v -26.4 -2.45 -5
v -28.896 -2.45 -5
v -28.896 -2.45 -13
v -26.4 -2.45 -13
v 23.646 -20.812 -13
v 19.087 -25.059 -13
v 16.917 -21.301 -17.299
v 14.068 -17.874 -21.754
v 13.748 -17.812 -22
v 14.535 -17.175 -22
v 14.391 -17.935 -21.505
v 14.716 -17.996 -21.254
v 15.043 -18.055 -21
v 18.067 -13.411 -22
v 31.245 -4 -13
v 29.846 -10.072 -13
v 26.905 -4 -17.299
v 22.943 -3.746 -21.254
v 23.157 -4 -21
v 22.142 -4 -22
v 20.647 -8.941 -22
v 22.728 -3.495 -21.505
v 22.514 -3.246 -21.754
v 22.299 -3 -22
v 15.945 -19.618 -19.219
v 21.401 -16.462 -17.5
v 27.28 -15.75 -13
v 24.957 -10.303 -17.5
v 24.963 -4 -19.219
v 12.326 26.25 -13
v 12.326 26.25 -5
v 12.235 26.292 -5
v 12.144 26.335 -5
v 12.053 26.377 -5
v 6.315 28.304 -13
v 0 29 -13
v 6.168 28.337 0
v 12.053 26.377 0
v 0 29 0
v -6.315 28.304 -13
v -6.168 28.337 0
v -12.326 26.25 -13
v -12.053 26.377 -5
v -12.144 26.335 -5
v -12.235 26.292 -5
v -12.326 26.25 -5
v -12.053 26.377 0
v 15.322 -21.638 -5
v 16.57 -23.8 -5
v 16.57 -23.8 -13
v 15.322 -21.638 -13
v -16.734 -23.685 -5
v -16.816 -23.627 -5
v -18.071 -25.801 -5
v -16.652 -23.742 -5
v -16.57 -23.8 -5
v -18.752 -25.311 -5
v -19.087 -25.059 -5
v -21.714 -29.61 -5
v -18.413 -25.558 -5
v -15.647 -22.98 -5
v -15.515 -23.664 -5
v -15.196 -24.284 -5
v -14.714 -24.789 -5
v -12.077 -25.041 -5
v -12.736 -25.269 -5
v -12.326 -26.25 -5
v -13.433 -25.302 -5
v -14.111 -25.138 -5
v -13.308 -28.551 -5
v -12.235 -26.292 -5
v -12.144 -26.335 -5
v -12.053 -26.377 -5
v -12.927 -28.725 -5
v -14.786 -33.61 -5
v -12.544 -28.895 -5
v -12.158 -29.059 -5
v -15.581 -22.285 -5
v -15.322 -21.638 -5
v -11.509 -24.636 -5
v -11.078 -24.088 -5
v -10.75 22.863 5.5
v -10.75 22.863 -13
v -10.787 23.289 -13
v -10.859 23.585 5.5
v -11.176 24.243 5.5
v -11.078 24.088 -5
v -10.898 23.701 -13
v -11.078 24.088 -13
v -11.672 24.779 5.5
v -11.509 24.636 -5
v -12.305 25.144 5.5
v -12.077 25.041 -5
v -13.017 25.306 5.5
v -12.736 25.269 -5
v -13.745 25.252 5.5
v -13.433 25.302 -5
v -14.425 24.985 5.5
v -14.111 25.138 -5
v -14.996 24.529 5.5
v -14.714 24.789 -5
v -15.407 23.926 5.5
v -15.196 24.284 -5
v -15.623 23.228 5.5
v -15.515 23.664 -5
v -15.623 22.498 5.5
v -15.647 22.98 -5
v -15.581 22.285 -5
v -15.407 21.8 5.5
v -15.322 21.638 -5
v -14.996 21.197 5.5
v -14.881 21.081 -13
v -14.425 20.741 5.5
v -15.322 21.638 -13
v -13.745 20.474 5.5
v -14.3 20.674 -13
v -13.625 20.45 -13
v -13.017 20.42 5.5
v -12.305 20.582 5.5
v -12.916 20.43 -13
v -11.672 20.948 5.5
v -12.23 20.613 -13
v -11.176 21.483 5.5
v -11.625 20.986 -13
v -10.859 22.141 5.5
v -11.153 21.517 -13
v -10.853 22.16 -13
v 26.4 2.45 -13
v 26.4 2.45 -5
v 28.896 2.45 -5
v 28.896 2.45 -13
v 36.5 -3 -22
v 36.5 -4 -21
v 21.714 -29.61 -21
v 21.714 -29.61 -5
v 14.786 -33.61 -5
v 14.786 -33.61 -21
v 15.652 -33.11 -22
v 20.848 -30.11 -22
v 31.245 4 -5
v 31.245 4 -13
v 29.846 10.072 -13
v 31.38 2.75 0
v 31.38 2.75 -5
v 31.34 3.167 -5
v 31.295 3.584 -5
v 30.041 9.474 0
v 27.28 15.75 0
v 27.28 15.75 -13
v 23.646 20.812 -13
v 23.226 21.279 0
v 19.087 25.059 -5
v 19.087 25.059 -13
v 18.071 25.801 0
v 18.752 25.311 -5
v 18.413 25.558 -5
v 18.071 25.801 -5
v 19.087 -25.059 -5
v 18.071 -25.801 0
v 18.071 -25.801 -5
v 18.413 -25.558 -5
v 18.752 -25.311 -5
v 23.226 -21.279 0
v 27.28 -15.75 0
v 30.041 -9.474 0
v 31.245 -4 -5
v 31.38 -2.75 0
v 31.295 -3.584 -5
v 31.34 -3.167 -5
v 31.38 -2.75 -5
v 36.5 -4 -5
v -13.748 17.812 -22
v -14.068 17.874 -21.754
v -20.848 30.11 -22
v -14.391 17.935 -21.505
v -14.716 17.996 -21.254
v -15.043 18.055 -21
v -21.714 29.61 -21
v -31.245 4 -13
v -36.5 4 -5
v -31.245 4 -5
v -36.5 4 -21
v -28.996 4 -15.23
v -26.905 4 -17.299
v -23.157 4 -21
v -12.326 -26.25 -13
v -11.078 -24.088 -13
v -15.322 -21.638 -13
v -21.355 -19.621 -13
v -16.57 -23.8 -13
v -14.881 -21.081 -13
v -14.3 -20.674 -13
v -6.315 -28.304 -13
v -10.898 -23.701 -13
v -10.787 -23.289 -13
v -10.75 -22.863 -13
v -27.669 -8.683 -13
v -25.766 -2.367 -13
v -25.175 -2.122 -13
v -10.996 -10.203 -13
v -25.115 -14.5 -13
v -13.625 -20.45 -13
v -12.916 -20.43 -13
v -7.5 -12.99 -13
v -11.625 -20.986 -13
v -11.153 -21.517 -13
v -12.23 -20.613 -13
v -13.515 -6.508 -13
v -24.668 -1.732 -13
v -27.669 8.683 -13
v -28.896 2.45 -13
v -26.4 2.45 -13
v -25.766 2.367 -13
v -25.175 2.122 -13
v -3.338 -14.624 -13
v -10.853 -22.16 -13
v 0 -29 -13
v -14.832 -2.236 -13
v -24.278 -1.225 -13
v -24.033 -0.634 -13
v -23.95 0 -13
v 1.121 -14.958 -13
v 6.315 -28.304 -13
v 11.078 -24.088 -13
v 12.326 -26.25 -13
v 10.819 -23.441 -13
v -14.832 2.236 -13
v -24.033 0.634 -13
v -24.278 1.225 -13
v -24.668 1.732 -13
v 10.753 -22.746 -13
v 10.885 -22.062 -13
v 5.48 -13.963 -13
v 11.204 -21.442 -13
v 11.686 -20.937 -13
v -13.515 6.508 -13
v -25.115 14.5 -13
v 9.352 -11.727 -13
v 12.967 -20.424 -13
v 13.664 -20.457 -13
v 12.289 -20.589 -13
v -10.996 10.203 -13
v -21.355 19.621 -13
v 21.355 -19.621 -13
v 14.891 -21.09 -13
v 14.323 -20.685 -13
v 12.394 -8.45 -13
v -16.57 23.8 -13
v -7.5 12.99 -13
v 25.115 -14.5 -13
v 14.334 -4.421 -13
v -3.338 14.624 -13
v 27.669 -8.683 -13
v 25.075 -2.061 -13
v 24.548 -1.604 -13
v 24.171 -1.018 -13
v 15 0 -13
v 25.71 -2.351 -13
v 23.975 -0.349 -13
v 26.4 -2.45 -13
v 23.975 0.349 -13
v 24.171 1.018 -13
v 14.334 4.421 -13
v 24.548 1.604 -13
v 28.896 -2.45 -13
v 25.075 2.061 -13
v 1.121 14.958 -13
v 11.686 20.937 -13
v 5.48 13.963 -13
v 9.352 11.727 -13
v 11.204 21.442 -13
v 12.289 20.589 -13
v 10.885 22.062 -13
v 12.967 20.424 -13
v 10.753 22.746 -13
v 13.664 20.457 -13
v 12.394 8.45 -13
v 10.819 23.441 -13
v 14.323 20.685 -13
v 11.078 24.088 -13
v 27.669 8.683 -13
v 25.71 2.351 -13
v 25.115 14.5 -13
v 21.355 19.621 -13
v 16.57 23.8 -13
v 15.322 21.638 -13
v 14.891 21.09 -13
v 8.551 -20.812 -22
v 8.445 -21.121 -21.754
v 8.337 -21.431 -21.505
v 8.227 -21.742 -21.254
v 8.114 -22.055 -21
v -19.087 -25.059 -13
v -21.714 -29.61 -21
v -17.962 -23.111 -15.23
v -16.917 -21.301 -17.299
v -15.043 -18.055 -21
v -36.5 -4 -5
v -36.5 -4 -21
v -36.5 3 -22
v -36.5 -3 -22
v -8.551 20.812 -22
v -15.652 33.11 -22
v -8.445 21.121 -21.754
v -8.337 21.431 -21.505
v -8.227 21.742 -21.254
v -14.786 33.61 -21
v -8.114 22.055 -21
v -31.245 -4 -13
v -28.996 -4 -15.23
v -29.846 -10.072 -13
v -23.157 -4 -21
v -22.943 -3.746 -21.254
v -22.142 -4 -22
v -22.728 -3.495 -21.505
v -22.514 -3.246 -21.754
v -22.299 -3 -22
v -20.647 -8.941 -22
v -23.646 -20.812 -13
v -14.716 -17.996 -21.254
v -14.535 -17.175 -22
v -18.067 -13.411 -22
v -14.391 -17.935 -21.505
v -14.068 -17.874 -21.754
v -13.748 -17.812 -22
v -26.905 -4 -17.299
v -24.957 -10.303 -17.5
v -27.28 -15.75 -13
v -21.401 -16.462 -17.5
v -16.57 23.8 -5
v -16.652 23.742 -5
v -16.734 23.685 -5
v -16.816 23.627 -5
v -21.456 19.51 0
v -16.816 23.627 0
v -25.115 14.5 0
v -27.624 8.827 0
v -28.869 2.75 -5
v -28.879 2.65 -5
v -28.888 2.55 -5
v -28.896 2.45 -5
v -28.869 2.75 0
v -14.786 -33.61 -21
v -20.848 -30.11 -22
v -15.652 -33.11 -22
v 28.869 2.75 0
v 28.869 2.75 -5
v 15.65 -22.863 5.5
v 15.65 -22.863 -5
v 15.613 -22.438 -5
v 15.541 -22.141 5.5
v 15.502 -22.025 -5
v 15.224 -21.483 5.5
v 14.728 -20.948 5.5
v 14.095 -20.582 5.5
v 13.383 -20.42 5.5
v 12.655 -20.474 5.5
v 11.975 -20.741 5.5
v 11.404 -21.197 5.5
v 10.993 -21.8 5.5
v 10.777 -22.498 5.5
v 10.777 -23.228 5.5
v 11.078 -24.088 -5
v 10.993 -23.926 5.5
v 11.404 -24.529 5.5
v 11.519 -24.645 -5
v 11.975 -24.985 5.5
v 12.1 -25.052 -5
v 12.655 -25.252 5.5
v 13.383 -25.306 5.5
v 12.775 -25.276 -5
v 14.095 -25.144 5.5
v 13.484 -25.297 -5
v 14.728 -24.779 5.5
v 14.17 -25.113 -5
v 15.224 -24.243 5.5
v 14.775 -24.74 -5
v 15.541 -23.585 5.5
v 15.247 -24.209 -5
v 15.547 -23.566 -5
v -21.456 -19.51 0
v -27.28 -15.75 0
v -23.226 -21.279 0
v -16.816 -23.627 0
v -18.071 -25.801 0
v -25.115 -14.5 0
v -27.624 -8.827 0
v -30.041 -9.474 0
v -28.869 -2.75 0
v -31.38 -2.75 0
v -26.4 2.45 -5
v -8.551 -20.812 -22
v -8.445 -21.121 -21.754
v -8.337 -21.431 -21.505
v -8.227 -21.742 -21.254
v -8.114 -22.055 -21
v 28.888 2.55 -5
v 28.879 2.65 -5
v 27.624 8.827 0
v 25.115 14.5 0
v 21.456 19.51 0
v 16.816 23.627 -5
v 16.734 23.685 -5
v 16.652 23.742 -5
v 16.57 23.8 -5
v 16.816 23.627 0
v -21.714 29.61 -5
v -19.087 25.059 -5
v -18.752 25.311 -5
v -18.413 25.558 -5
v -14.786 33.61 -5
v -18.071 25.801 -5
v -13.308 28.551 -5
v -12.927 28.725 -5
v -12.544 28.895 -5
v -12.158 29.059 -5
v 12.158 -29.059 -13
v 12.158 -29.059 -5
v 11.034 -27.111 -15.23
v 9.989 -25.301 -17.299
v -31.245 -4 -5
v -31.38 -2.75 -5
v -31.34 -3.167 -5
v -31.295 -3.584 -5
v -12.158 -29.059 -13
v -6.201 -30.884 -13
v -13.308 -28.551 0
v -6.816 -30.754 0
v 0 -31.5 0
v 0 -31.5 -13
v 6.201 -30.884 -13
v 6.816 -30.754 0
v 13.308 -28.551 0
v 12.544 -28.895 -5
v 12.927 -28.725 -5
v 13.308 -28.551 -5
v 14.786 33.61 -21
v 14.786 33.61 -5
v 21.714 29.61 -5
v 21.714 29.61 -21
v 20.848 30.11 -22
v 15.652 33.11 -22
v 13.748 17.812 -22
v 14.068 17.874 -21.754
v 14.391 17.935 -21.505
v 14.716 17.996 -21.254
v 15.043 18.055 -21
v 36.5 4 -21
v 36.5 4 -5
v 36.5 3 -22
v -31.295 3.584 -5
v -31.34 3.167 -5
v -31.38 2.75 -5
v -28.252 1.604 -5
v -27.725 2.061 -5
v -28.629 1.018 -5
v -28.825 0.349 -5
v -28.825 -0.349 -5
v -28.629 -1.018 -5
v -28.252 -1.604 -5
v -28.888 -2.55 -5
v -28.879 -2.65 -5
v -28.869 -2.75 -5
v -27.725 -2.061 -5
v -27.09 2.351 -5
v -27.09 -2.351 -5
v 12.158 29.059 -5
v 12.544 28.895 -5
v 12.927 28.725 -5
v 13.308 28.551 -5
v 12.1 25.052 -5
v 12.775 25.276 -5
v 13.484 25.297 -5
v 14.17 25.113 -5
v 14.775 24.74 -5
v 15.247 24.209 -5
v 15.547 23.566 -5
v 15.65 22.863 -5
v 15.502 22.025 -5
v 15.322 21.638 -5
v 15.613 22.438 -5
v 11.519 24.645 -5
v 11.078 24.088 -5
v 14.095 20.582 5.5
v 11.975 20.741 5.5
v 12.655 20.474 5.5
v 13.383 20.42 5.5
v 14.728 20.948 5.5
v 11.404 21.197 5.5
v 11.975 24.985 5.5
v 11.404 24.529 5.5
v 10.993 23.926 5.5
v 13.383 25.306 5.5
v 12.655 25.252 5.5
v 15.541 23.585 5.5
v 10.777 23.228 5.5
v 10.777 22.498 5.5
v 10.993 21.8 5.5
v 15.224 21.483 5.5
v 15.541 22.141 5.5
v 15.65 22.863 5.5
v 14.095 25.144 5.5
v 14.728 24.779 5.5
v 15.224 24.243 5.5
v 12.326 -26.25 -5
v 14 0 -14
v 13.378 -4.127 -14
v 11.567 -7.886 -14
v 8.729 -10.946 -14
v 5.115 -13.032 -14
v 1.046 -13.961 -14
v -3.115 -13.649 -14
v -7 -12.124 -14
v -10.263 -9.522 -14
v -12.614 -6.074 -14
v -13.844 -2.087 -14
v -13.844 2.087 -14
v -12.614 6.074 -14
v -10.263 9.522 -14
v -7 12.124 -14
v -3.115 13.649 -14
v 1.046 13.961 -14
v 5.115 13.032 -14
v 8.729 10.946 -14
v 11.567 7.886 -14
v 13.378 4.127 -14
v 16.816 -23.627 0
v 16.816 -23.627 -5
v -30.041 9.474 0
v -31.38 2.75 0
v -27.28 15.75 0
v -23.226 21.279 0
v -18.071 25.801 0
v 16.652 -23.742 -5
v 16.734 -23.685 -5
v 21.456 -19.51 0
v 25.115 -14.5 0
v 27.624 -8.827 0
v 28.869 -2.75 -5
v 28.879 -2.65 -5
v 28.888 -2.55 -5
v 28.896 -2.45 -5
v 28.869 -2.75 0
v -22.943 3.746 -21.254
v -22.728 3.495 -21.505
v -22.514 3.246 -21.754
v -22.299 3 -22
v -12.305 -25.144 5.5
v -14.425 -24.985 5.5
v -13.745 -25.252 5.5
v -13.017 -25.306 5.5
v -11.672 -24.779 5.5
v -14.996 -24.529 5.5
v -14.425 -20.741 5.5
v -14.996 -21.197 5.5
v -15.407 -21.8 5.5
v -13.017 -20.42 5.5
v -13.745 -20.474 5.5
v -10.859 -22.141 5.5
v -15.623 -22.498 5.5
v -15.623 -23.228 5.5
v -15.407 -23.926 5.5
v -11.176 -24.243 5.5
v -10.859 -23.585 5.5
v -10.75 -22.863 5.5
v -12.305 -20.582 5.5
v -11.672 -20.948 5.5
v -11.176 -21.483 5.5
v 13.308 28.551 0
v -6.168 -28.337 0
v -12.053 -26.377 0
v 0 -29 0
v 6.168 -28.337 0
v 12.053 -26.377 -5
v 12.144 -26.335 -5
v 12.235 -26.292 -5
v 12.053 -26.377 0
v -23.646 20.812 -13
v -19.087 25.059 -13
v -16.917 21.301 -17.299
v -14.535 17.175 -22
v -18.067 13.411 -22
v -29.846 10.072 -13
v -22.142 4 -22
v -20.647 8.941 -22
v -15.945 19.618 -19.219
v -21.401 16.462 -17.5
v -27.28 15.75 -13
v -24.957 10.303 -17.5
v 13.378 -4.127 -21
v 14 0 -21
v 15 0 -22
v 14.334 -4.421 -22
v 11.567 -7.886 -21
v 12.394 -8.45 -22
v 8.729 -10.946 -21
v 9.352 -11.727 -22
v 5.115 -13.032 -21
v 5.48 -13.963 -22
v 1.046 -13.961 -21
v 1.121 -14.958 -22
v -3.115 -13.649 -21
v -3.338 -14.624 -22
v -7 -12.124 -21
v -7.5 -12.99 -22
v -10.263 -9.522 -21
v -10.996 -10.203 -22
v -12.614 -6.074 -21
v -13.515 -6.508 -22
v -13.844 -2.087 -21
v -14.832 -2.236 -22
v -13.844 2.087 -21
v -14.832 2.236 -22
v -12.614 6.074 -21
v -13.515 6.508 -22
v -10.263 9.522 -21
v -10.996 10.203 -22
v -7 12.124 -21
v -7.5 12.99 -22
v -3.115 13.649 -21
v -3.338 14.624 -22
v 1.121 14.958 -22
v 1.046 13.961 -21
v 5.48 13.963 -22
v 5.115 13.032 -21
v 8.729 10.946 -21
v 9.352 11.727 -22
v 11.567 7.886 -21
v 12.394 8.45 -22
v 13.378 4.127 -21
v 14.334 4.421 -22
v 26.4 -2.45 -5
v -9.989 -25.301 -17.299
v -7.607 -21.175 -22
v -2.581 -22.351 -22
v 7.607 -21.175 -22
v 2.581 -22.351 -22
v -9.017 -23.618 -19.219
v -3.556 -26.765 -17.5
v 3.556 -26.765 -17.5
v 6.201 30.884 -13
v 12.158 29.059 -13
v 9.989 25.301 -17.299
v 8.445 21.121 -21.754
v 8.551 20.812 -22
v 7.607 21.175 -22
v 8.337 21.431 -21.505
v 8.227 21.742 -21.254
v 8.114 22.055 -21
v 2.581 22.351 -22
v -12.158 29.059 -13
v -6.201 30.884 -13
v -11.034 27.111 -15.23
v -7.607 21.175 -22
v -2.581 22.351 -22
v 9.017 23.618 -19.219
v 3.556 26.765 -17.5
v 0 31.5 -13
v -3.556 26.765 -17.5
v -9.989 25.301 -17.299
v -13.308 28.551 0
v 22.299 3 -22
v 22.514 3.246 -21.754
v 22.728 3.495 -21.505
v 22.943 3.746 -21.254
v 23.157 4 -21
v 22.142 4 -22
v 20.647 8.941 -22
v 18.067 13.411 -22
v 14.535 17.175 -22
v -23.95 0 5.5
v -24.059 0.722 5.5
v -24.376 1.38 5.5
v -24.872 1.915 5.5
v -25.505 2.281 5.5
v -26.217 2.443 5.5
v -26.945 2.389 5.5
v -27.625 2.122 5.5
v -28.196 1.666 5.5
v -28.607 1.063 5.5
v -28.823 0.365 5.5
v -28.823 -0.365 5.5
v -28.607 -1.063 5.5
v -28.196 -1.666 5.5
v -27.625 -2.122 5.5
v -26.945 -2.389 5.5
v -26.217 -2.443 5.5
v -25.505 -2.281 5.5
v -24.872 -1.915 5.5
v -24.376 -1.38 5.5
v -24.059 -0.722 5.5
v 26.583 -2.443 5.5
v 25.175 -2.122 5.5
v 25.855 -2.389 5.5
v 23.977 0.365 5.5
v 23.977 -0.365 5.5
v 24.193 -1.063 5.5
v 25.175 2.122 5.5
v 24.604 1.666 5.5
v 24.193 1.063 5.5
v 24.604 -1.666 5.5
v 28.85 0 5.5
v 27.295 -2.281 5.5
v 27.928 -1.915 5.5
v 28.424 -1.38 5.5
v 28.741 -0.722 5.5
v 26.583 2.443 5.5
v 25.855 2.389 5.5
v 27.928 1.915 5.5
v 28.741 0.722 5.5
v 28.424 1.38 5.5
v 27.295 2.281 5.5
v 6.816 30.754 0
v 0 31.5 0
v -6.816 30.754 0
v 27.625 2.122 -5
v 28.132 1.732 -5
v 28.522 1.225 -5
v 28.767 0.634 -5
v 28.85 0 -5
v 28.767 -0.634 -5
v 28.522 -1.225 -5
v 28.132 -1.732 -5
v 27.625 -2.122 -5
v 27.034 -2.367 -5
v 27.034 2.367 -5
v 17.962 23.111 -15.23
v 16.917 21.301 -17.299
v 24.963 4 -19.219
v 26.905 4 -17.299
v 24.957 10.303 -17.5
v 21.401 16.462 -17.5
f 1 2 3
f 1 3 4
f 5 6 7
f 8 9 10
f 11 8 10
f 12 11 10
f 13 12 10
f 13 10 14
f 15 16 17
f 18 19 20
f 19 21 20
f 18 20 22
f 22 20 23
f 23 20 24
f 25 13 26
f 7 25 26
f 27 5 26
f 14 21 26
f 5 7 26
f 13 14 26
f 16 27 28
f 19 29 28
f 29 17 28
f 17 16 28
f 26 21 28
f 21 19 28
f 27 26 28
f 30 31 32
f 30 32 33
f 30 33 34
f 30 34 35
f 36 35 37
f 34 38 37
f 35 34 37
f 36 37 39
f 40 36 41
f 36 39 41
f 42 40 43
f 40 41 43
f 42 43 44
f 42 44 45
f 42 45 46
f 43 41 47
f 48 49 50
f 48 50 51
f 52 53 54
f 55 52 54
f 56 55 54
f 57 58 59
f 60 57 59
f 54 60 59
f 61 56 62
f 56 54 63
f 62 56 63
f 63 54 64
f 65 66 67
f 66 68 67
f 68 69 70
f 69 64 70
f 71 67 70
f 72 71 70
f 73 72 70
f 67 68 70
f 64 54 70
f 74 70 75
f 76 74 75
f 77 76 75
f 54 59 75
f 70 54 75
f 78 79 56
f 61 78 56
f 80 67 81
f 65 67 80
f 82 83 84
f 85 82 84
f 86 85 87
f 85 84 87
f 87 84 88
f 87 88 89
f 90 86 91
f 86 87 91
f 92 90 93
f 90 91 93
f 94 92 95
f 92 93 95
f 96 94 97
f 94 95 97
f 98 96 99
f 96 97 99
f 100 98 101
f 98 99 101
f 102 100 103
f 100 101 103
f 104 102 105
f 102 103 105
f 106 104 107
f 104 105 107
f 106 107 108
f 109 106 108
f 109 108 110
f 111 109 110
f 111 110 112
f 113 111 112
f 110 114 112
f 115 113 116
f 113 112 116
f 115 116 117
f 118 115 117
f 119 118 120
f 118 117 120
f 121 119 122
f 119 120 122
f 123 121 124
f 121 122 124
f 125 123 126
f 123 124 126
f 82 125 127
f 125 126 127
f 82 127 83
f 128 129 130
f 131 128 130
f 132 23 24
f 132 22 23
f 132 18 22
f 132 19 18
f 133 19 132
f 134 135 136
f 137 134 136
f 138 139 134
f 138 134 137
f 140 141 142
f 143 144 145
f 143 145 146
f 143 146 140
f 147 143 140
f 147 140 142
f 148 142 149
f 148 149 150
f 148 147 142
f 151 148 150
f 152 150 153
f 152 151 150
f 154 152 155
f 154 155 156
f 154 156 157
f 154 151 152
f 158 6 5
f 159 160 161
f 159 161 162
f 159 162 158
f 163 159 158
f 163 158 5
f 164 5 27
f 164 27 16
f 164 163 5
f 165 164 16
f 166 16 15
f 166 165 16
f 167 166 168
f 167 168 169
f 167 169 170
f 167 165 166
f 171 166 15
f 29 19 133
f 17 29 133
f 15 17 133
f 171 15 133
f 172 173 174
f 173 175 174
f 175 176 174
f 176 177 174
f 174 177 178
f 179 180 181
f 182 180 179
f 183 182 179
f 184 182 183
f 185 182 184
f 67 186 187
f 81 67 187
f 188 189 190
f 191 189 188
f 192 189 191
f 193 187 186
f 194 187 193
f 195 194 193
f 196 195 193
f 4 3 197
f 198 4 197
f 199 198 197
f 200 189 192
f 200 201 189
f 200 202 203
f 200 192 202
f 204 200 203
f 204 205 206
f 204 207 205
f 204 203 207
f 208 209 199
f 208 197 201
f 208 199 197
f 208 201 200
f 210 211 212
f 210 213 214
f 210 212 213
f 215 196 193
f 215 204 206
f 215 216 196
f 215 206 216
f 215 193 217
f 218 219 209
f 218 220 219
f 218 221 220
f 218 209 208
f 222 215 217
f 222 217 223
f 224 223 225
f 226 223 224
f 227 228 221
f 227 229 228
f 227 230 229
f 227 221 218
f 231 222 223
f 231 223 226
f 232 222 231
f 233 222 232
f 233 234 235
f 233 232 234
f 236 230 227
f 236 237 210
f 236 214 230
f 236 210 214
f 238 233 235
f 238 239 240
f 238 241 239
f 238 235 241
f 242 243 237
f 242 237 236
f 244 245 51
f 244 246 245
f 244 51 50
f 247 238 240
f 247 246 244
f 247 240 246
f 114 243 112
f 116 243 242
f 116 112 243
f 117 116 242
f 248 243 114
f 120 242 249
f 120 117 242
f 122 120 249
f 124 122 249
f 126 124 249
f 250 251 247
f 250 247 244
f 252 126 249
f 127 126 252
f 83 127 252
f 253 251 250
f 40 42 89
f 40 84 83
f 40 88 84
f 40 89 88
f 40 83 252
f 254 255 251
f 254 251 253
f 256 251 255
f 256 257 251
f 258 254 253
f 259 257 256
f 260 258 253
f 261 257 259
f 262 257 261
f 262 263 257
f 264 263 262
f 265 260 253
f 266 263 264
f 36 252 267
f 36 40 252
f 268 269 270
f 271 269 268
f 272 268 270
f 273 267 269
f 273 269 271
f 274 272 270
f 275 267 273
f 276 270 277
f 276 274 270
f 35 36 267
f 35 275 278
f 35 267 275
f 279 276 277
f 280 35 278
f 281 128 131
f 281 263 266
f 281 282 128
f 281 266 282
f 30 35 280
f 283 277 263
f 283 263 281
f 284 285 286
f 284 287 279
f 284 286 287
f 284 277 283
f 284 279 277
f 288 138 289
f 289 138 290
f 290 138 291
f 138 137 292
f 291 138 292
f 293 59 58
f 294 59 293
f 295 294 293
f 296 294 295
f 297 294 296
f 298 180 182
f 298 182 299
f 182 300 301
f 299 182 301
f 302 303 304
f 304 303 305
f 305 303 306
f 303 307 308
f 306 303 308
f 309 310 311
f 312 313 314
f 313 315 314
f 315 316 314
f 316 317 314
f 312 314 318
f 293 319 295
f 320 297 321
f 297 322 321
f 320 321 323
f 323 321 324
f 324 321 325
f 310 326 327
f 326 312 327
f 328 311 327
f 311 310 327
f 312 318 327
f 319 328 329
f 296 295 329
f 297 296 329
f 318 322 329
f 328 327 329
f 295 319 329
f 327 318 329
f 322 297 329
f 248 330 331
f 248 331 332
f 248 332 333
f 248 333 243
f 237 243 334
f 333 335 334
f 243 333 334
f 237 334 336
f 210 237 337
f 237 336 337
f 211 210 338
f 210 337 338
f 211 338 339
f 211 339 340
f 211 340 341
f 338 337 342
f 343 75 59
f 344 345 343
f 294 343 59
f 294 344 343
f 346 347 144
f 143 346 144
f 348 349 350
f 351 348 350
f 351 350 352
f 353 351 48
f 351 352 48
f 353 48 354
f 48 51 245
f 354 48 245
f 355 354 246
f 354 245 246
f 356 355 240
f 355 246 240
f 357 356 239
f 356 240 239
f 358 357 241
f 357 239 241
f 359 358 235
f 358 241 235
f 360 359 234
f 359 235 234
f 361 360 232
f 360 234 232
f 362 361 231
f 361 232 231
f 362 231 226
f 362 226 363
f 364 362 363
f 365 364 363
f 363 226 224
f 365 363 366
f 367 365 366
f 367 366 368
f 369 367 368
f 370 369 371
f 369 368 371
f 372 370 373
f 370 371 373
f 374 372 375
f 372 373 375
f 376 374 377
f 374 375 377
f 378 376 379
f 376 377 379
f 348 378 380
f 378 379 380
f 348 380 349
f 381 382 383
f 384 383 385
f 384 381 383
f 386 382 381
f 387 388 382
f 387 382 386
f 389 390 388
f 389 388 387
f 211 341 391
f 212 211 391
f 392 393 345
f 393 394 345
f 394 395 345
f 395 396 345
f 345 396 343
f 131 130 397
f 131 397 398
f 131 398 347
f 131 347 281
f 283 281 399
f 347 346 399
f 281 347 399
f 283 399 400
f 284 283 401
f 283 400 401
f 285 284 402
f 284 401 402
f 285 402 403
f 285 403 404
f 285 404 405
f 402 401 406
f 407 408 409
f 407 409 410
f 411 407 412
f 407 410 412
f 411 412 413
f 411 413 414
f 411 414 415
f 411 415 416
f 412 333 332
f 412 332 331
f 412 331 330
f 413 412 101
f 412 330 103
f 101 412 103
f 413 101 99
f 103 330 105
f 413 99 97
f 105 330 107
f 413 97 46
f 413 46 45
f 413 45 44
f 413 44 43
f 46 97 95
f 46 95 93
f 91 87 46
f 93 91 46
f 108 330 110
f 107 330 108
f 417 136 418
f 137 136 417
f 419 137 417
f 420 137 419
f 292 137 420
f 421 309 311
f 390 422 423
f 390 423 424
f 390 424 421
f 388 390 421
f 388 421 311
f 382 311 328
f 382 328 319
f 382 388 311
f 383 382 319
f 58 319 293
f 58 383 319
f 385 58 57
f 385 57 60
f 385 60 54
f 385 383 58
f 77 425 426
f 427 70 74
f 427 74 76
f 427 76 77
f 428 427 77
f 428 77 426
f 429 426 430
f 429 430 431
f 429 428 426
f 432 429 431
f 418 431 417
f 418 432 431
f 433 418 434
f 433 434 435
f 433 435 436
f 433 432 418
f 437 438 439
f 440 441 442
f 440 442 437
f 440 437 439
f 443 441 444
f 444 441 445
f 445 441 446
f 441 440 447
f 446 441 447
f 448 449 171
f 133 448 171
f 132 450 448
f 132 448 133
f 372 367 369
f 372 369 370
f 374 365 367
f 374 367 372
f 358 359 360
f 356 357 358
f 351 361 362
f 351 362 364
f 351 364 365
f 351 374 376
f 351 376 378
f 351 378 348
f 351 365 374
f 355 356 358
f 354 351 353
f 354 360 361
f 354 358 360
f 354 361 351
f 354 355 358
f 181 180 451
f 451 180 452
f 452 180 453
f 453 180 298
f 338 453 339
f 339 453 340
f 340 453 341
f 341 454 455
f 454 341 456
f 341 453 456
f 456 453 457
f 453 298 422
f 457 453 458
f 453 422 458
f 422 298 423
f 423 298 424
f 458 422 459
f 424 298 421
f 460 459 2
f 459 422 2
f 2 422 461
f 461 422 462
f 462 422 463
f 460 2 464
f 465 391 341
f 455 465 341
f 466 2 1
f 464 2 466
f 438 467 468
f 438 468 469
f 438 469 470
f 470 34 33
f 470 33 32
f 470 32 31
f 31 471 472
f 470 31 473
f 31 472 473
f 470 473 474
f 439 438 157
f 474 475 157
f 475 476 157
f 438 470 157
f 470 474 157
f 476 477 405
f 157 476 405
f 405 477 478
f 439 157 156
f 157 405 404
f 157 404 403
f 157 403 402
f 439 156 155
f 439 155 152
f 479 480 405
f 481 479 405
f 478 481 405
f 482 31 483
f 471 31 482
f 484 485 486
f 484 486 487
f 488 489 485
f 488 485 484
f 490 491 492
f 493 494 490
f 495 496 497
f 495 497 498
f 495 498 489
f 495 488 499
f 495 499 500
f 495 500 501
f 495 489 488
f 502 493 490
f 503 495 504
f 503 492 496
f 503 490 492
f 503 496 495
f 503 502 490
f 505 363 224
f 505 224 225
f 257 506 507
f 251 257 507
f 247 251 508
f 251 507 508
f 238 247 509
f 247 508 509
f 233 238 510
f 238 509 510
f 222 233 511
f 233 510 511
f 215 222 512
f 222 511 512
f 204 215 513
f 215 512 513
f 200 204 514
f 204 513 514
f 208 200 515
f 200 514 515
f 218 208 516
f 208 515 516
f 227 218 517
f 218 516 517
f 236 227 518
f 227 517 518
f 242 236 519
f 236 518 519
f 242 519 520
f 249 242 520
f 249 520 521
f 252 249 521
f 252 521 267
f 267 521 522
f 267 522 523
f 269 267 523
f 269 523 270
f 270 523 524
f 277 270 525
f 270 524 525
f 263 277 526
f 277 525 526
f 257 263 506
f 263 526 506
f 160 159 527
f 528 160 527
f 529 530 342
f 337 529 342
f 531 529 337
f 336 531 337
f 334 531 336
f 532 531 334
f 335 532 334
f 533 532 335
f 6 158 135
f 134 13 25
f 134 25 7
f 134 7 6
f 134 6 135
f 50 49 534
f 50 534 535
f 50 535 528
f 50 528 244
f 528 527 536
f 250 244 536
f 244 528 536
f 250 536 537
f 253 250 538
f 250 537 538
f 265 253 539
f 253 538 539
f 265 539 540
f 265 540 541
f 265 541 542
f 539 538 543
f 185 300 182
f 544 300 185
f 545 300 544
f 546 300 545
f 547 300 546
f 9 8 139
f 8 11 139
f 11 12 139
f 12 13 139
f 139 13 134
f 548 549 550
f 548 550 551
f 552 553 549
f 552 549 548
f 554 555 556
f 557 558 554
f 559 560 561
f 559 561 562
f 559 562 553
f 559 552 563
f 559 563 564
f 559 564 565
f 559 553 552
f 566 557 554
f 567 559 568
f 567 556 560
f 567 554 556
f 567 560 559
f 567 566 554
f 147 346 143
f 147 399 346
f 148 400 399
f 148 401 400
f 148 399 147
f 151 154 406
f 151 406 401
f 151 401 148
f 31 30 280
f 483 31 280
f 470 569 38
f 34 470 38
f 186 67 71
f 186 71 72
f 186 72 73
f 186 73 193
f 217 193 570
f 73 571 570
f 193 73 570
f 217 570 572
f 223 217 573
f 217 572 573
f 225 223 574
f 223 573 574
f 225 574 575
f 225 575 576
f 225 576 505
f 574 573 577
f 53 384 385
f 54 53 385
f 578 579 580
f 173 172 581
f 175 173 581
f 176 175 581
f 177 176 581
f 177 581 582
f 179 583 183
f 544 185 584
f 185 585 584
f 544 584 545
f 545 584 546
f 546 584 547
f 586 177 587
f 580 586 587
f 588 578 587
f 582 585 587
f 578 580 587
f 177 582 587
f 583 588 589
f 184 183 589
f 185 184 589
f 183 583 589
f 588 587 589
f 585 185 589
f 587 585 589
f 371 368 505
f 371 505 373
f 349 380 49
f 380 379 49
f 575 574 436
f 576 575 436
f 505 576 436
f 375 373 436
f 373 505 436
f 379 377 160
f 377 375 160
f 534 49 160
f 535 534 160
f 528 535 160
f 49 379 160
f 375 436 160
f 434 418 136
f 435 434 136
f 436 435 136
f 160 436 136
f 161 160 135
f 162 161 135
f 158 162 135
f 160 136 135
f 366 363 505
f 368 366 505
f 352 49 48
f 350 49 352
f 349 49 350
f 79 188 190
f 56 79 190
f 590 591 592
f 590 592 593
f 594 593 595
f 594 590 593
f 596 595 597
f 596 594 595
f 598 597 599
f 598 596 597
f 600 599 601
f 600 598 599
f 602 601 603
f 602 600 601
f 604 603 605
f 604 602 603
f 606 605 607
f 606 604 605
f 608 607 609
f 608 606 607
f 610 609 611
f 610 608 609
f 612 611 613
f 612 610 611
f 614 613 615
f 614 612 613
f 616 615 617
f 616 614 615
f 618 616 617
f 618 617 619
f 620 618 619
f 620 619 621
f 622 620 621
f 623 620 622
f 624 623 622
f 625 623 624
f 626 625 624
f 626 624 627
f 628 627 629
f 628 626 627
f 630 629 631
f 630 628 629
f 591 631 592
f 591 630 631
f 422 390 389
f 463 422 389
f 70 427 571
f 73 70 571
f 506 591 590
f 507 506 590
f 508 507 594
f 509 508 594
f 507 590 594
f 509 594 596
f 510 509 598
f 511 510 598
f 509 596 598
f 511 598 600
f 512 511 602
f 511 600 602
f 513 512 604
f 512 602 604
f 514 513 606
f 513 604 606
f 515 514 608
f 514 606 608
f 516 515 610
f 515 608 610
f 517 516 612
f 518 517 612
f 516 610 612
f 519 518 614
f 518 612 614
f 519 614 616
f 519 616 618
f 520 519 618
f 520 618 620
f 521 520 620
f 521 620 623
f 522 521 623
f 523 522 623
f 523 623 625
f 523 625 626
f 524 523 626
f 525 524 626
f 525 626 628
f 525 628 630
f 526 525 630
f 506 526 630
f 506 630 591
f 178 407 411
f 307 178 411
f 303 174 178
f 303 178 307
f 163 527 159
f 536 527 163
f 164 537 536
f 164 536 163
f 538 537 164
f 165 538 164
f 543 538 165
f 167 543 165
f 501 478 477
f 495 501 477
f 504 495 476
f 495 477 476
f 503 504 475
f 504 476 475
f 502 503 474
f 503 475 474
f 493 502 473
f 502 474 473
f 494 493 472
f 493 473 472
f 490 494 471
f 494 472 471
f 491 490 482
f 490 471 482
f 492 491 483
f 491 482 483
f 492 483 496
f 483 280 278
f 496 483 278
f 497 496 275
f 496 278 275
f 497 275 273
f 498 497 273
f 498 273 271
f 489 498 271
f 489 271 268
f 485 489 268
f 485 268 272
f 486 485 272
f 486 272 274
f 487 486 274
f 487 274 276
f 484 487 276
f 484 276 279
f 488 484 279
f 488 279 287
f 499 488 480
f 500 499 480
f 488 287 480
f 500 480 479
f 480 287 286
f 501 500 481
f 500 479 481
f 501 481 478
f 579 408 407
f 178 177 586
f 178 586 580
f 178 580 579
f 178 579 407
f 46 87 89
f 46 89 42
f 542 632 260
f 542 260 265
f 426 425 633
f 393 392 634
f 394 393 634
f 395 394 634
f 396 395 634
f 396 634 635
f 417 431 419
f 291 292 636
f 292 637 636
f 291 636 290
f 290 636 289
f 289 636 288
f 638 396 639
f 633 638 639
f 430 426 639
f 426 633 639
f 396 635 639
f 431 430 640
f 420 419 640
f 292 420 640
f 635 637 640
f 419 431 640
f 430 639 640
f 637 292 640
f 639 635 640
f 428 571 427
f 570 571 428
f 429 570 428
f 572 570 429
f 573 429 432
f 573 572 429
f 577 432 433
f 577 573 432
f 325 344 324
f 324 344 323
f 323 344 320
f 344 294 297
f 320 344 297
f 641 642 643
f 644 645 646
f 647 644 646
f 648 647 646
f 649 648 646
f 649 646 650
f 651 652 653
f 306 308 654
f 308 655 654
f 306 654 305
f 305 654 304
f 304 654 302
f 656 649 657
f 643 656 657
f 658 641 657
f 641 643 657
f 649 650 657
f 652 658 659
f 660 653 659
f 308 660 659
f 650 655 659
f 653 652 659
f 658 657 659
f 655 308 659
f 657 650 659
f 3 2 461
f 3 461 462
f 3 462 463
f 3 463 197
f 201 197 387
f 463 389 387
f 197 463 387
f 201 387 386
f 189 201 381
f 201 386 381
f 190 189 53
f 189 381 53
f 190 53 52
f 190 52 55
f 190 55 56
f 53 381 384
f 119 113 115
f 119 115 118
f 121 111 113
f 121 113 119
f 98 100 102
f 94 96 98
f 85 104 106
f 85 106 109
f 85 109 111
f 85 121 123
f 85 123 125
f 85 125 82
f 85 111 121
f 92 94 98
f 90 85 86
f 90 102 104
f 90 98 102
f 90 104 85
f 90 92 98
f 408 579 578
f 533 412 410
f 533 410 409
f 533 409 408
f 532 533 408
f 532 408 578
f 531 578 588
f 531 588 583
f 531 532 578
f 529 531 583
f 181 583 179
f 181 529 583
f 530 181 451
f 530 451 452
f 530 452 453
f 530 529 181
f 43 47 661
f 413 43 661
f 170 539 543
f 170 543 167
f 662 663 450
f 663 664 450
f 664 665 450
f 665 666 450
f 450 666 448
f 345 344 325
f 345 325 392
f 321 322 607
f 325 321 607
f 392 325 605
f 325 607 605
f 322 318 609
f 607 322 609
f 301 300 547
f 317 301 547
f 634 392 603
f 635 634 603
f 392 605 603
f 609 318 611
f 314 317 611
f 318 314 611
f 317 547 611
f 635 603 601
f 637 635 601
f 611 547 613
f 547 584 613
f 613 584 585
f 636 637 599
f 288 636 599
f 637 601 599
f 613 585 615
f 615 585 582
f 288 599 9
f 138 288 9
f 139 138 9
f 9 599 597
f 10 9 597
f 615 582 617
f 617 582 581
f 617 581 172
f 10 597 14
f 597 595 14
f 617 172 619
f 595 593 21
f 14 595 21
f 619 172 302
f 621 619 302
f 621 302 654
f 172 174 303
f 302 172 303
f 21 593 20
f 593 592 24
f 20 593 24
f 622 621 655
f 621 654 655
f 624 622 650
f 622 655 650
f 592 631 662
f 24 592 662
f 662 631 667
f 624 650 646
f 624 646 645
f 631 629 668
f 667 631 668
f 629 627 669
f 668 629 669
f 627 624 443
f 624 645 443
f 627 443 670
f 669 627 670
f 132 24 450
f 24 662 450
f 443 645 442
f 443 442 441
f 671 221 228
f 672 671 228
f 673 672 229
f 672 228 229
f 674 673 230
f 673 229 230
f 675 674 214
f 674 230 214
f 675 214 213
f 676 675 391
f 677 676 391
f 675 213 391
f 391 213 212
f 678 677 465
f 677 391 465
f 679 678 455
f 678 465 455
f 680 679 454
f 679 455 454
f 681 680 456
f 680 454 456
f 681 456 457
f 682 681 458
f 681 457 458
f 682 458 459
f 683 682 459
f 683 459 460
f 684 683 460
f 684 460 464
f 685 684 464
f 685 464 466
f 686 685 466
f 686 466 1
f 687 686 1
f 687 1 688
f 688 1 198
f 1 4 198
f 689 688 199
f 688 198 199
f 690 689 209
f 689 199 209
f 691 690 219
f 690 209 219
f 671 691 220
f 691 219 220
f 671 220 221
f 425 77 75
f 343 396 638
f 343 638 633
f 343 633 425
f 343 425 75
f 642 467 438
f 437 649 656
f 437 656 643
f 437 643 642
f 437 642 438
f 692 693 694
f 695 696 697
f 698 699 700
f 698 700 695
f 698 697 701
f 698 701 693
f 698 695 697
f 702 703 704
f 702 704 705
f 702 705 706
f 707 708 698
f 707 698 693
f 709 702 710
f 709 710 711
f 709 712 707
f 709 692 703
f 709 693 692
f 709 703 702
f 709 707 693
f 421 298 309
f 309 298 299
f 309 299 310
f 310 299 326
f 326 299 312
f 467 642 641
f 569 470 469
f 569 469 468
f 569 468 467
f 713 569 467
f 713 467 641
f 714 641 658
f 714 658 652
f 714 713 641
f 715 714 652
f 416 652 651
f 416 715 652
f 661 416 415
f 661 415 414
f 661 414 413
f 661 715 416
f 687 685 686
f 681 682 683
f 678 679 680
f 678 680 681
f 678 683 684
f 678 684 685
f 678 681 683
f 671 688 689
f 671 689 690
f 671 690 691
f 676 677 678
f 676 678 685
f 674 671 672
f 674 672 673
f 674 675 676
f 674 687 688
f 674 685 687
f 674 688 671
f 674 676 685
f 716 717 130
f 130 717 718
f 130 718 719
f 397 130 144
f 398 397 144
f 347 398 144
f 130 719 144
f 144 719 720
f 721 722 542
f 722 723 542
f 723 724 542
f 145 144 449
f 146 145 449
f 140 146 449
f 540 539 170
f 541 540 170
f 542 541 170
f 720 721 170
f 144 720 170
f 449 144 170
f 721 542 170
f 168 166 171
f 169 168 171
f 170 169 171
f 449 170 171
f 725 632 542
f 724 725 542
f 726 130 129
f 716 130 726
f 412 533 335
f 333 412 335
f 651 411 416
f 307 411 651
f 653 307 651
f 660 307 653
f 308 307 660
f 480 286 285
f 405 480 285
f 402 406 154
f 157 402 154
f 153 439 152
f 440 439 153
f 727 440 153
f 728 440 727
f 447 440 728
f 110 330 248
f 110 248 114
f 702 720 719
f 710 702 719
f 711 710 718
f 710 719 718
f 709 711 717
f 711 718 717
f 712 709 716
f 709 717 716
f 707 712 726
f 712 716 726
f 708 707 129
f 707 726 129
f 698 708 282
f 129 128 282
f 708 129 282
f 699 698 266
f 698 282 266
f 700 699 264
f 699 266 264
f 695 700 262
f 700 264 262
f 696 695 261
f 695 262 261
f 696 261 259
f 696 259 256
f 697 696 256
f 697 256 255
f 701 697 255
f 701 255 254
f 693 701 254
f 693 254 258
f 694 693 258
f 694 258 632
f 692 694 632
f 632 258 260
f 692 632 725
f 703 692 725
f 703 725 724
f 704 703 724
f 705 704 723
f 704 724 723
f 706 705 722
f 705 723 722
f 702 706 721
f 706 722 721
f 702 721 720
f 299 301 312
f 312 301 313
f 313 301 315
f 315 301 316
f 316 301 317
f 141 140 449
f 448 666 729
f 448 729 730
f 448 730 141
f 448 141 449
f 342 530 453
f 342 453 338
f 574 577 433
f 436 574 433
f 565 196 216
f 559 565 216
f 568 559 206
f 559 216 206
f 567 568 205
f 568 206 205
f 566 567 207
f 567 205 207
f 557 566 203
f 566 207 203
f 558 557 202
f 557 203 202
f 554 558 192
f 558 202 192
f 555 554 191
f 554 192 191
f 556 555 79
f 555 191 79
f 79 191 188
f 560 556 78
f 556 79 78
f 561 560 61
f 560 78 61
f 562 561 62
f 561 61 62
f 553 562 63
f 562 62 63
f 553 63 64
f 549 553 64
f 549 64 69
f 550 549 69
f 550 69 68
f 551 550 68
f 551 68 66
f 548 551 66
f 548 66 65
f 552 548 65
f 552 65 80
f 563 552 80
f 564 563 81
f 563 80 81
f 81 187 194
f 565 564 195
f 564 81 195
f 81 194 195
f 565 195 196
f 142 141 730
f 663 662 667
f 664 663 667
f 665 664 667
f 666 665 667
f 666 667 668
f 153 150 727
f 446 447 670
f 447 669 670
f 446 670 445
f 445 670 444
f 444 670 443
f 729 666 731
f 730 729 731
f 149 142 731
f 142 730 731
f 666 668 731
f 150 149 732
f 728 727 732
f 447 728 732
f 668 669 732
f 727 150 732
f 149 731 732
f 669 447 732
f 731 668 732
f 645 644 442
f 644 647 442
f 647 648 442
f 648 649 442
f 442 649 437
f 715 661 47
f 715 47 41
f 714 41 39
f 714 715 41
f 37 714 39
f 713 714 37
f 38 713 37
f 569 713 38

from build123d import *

# Parameters (mm, degrees)
F0_R      = 31.5
F1_DEPTH  = 22
F3_R      = 14
F4_DEPTH  = 22.001
F5_SIZE   = 9
F6_W      = 15
F6_H      = 8
F7_DEPTH  = 17
F2_R      = 29
F8_DEPTH  = 13
F9_W      = 11.6111175559
F9_H      = 5.5
F10_DEPTH = 5
F11_R     = 2.45
F12_DEPTH = 18.5
F13_W     = 3.3197699547
F13_H     = 4.9
F14_DEPTH = 8
F15_SIZE  = 1


with BuildPart() as f1:
    # F0 (on Top) → F1 (new body)
    with BuildSketch(Plane.XY):
        Circle(F0_R)
    extrude(amount=-F1_DEPTH)

    # F3 (on face) → F4 (cut, through all)
    with BuildSketch(Plane(origin=(0, 0, -22), x_dir=(1, 0, 0), z_dir=(0, 0, -1))):
        Circle(F3_R)
    extrude(amount=-F4_DEPTH, mode=Mode.SUBTRACT)

    # F5
    f5_edges = [f1.edges().sort_by_distance(p)[0] for p in [
        (-31.5, 0, -22),
    ]]
    chamfer(f5_edges, length=F5_SIZE)

    # F6 (on face) → F7 (join)
    with BuildSketch(Plane(origin=(0, 0, -22), x_dir=(1, 0, 0), z_dir=(0, 0, -1))):
        with Locations((29, 0)):
            Rectangle(F6_W, F6_H)
        Polygon((21.7141016151, 29.6099272381), (14.7858983849, 33.6099272381), (7.2858983849, 20.6195461814), (14.2141016151, 16.6195461814), align=None)
        Polygon((-14.7858983849, 33.6099272381), (-21.7141016151, 29.6099272381), (-14.2141016151, 16.6195461814), (-7.2858983849, 20.6195461814), align=None)
        with Locations((-29, 0)):
            Rectangle(F6_W, F6_H)
        Polygon((-21.7141016151, -29.6099272381), (-14.7858983849, -33.6099272381), (-7.2858983849, -20.6195461814), (-14.2141016151, -16.6195461814), align=None)
        Polygon((14.7858983849, -33.6099272381), (21.7141016151, -29.6099272381), (14.2141016151, -16.6195461814), (7.2858983849, -20.6195461814), align=None)
    extrude(amount=-F7_DEPTH)

    # F2 (on face) → F8 (cut)
    with BuildSketch(Plane.XY):
        Circle(F2_R)
    extrude(amount=-F8_DEPTH, mode=Mode.SUBTRACT)

    # F9 (on face) → F10 (cut)
    with BuildSketch(Plane.XY):
        with Locations((30.3034381941, 0)):
            Rectangle(F9_W, F9_H)
        Polygon((20.4360683464, 29.896308683), (15.6729286256, 32.646308683), (9.8673698477, 22.5907859132), (14.6305095685, 19.8407859132), align=None)
        Polygon((-15.6729286256, 32.646308683), (-20.4360683464, 29.896308683), (-14.6305095685, 19.8407859132), (-9.8673698477, 22.5907859132), align=None)
        with Locations((-30.3034381941, 0)):
            Rectangle(F9_W, F9_H)
        Polygon((-20.4360683464, -29.896308683), (-15.6729286256, -32.646308683), (-9.8673698477, -22.5907859132), (-14.6305095685, -19.8407859132), align=None)
        Polygon((15.6729286256, -32.646308683), (20.4360683464, -29.896308683), (14.6305095685, -19.8407859132), (9.8673698477, -22.5907859132), align=None)
    extrude(amount=-F10_DEPTH, mode=Mode.SUBTRACT)

    # F11 (on face) → F12 (join)
    with BuildSketch(Plane.XY.offset(-13)):
        with Locations((-26.4, 0)):
            Circle(F11_R)
        with Locations((-13.2, -22.8630706599)):
            Circle(F11_R)
        with Locations((13.2, -22.8630706599)):
            Circle(F11_R)
        with Locations((26.4, 0)):
            Circle(F11_R)
        with Locations((13.2, 22.8630706599)):
            Circle(F11_R)
        with Locations((-13.2, 22.8630706599)):
            Circle(F11_R)
    extrude(amount=F12_DEPTH)

    # F13 (on face) → F14 (join)
    with BuildSketch(Plane.XY.offset(-13)):
        with Locations((-28.0598849773, 0)):
            Rectangle(F13_W, F13_H)
        Polygon((-16.9816472166, -24.5130757754), (-12.7381227381, -26.9630757754), (-11.0782377607, -24.0880706599), (-15.3217622393, -21.6380706599), align=None)
        Polygon((12.7381227381, -26.9630757754), (16.9816472166, -24.5130757754), (15.3217622393, -21.6380706599), (11.0782377607, -24.0880706599), align=None)
        with Locations((28.0598849773, 0)):
            Rectangle(F13_W, F13_H)
        Polygon((16.9816472166, 24.5130757754), (12.7381227381, 26.9630757754), (11.0782377607, 24.0880706599), (15.3217622393, 21.6380706599), align=None)
        Polygon((-12.7381227381, 26.9630757754), (-16.9816472166, 24.5130757754), (-15.3217622393, 21.6380706599), (-11.0782377607, 24.0880706599), align=None)
    extrude(amount=F14_DEPTH)

    # F15
    f15_edges = [f1.edges().sort_by_distance(p)[0] for p in [
        (-14, 0, -22),
        (-14, 0, -13),
        (-18.124499, -23.392553, -22),
        (-11.196296, -27.392553, -22),
        (11.196296, -27.392553, -22),
        (18.124499, -23.392553, -22),
        (29.320795, -4, -22),
        (29.320795, 4, -22),
        (18.124499, 23.392553, -22),
        (11.196296, 27.392553, -22),
        (-11.196296, 27.392553, -22),
        (-18.124499, 23.392553, -22),
        (-29.320795, 4, -22),
        (-29.320795, -4, -22),
    ]]
    chamfer(f15_edges, length=F15_SIZE)


solid = f1.part
